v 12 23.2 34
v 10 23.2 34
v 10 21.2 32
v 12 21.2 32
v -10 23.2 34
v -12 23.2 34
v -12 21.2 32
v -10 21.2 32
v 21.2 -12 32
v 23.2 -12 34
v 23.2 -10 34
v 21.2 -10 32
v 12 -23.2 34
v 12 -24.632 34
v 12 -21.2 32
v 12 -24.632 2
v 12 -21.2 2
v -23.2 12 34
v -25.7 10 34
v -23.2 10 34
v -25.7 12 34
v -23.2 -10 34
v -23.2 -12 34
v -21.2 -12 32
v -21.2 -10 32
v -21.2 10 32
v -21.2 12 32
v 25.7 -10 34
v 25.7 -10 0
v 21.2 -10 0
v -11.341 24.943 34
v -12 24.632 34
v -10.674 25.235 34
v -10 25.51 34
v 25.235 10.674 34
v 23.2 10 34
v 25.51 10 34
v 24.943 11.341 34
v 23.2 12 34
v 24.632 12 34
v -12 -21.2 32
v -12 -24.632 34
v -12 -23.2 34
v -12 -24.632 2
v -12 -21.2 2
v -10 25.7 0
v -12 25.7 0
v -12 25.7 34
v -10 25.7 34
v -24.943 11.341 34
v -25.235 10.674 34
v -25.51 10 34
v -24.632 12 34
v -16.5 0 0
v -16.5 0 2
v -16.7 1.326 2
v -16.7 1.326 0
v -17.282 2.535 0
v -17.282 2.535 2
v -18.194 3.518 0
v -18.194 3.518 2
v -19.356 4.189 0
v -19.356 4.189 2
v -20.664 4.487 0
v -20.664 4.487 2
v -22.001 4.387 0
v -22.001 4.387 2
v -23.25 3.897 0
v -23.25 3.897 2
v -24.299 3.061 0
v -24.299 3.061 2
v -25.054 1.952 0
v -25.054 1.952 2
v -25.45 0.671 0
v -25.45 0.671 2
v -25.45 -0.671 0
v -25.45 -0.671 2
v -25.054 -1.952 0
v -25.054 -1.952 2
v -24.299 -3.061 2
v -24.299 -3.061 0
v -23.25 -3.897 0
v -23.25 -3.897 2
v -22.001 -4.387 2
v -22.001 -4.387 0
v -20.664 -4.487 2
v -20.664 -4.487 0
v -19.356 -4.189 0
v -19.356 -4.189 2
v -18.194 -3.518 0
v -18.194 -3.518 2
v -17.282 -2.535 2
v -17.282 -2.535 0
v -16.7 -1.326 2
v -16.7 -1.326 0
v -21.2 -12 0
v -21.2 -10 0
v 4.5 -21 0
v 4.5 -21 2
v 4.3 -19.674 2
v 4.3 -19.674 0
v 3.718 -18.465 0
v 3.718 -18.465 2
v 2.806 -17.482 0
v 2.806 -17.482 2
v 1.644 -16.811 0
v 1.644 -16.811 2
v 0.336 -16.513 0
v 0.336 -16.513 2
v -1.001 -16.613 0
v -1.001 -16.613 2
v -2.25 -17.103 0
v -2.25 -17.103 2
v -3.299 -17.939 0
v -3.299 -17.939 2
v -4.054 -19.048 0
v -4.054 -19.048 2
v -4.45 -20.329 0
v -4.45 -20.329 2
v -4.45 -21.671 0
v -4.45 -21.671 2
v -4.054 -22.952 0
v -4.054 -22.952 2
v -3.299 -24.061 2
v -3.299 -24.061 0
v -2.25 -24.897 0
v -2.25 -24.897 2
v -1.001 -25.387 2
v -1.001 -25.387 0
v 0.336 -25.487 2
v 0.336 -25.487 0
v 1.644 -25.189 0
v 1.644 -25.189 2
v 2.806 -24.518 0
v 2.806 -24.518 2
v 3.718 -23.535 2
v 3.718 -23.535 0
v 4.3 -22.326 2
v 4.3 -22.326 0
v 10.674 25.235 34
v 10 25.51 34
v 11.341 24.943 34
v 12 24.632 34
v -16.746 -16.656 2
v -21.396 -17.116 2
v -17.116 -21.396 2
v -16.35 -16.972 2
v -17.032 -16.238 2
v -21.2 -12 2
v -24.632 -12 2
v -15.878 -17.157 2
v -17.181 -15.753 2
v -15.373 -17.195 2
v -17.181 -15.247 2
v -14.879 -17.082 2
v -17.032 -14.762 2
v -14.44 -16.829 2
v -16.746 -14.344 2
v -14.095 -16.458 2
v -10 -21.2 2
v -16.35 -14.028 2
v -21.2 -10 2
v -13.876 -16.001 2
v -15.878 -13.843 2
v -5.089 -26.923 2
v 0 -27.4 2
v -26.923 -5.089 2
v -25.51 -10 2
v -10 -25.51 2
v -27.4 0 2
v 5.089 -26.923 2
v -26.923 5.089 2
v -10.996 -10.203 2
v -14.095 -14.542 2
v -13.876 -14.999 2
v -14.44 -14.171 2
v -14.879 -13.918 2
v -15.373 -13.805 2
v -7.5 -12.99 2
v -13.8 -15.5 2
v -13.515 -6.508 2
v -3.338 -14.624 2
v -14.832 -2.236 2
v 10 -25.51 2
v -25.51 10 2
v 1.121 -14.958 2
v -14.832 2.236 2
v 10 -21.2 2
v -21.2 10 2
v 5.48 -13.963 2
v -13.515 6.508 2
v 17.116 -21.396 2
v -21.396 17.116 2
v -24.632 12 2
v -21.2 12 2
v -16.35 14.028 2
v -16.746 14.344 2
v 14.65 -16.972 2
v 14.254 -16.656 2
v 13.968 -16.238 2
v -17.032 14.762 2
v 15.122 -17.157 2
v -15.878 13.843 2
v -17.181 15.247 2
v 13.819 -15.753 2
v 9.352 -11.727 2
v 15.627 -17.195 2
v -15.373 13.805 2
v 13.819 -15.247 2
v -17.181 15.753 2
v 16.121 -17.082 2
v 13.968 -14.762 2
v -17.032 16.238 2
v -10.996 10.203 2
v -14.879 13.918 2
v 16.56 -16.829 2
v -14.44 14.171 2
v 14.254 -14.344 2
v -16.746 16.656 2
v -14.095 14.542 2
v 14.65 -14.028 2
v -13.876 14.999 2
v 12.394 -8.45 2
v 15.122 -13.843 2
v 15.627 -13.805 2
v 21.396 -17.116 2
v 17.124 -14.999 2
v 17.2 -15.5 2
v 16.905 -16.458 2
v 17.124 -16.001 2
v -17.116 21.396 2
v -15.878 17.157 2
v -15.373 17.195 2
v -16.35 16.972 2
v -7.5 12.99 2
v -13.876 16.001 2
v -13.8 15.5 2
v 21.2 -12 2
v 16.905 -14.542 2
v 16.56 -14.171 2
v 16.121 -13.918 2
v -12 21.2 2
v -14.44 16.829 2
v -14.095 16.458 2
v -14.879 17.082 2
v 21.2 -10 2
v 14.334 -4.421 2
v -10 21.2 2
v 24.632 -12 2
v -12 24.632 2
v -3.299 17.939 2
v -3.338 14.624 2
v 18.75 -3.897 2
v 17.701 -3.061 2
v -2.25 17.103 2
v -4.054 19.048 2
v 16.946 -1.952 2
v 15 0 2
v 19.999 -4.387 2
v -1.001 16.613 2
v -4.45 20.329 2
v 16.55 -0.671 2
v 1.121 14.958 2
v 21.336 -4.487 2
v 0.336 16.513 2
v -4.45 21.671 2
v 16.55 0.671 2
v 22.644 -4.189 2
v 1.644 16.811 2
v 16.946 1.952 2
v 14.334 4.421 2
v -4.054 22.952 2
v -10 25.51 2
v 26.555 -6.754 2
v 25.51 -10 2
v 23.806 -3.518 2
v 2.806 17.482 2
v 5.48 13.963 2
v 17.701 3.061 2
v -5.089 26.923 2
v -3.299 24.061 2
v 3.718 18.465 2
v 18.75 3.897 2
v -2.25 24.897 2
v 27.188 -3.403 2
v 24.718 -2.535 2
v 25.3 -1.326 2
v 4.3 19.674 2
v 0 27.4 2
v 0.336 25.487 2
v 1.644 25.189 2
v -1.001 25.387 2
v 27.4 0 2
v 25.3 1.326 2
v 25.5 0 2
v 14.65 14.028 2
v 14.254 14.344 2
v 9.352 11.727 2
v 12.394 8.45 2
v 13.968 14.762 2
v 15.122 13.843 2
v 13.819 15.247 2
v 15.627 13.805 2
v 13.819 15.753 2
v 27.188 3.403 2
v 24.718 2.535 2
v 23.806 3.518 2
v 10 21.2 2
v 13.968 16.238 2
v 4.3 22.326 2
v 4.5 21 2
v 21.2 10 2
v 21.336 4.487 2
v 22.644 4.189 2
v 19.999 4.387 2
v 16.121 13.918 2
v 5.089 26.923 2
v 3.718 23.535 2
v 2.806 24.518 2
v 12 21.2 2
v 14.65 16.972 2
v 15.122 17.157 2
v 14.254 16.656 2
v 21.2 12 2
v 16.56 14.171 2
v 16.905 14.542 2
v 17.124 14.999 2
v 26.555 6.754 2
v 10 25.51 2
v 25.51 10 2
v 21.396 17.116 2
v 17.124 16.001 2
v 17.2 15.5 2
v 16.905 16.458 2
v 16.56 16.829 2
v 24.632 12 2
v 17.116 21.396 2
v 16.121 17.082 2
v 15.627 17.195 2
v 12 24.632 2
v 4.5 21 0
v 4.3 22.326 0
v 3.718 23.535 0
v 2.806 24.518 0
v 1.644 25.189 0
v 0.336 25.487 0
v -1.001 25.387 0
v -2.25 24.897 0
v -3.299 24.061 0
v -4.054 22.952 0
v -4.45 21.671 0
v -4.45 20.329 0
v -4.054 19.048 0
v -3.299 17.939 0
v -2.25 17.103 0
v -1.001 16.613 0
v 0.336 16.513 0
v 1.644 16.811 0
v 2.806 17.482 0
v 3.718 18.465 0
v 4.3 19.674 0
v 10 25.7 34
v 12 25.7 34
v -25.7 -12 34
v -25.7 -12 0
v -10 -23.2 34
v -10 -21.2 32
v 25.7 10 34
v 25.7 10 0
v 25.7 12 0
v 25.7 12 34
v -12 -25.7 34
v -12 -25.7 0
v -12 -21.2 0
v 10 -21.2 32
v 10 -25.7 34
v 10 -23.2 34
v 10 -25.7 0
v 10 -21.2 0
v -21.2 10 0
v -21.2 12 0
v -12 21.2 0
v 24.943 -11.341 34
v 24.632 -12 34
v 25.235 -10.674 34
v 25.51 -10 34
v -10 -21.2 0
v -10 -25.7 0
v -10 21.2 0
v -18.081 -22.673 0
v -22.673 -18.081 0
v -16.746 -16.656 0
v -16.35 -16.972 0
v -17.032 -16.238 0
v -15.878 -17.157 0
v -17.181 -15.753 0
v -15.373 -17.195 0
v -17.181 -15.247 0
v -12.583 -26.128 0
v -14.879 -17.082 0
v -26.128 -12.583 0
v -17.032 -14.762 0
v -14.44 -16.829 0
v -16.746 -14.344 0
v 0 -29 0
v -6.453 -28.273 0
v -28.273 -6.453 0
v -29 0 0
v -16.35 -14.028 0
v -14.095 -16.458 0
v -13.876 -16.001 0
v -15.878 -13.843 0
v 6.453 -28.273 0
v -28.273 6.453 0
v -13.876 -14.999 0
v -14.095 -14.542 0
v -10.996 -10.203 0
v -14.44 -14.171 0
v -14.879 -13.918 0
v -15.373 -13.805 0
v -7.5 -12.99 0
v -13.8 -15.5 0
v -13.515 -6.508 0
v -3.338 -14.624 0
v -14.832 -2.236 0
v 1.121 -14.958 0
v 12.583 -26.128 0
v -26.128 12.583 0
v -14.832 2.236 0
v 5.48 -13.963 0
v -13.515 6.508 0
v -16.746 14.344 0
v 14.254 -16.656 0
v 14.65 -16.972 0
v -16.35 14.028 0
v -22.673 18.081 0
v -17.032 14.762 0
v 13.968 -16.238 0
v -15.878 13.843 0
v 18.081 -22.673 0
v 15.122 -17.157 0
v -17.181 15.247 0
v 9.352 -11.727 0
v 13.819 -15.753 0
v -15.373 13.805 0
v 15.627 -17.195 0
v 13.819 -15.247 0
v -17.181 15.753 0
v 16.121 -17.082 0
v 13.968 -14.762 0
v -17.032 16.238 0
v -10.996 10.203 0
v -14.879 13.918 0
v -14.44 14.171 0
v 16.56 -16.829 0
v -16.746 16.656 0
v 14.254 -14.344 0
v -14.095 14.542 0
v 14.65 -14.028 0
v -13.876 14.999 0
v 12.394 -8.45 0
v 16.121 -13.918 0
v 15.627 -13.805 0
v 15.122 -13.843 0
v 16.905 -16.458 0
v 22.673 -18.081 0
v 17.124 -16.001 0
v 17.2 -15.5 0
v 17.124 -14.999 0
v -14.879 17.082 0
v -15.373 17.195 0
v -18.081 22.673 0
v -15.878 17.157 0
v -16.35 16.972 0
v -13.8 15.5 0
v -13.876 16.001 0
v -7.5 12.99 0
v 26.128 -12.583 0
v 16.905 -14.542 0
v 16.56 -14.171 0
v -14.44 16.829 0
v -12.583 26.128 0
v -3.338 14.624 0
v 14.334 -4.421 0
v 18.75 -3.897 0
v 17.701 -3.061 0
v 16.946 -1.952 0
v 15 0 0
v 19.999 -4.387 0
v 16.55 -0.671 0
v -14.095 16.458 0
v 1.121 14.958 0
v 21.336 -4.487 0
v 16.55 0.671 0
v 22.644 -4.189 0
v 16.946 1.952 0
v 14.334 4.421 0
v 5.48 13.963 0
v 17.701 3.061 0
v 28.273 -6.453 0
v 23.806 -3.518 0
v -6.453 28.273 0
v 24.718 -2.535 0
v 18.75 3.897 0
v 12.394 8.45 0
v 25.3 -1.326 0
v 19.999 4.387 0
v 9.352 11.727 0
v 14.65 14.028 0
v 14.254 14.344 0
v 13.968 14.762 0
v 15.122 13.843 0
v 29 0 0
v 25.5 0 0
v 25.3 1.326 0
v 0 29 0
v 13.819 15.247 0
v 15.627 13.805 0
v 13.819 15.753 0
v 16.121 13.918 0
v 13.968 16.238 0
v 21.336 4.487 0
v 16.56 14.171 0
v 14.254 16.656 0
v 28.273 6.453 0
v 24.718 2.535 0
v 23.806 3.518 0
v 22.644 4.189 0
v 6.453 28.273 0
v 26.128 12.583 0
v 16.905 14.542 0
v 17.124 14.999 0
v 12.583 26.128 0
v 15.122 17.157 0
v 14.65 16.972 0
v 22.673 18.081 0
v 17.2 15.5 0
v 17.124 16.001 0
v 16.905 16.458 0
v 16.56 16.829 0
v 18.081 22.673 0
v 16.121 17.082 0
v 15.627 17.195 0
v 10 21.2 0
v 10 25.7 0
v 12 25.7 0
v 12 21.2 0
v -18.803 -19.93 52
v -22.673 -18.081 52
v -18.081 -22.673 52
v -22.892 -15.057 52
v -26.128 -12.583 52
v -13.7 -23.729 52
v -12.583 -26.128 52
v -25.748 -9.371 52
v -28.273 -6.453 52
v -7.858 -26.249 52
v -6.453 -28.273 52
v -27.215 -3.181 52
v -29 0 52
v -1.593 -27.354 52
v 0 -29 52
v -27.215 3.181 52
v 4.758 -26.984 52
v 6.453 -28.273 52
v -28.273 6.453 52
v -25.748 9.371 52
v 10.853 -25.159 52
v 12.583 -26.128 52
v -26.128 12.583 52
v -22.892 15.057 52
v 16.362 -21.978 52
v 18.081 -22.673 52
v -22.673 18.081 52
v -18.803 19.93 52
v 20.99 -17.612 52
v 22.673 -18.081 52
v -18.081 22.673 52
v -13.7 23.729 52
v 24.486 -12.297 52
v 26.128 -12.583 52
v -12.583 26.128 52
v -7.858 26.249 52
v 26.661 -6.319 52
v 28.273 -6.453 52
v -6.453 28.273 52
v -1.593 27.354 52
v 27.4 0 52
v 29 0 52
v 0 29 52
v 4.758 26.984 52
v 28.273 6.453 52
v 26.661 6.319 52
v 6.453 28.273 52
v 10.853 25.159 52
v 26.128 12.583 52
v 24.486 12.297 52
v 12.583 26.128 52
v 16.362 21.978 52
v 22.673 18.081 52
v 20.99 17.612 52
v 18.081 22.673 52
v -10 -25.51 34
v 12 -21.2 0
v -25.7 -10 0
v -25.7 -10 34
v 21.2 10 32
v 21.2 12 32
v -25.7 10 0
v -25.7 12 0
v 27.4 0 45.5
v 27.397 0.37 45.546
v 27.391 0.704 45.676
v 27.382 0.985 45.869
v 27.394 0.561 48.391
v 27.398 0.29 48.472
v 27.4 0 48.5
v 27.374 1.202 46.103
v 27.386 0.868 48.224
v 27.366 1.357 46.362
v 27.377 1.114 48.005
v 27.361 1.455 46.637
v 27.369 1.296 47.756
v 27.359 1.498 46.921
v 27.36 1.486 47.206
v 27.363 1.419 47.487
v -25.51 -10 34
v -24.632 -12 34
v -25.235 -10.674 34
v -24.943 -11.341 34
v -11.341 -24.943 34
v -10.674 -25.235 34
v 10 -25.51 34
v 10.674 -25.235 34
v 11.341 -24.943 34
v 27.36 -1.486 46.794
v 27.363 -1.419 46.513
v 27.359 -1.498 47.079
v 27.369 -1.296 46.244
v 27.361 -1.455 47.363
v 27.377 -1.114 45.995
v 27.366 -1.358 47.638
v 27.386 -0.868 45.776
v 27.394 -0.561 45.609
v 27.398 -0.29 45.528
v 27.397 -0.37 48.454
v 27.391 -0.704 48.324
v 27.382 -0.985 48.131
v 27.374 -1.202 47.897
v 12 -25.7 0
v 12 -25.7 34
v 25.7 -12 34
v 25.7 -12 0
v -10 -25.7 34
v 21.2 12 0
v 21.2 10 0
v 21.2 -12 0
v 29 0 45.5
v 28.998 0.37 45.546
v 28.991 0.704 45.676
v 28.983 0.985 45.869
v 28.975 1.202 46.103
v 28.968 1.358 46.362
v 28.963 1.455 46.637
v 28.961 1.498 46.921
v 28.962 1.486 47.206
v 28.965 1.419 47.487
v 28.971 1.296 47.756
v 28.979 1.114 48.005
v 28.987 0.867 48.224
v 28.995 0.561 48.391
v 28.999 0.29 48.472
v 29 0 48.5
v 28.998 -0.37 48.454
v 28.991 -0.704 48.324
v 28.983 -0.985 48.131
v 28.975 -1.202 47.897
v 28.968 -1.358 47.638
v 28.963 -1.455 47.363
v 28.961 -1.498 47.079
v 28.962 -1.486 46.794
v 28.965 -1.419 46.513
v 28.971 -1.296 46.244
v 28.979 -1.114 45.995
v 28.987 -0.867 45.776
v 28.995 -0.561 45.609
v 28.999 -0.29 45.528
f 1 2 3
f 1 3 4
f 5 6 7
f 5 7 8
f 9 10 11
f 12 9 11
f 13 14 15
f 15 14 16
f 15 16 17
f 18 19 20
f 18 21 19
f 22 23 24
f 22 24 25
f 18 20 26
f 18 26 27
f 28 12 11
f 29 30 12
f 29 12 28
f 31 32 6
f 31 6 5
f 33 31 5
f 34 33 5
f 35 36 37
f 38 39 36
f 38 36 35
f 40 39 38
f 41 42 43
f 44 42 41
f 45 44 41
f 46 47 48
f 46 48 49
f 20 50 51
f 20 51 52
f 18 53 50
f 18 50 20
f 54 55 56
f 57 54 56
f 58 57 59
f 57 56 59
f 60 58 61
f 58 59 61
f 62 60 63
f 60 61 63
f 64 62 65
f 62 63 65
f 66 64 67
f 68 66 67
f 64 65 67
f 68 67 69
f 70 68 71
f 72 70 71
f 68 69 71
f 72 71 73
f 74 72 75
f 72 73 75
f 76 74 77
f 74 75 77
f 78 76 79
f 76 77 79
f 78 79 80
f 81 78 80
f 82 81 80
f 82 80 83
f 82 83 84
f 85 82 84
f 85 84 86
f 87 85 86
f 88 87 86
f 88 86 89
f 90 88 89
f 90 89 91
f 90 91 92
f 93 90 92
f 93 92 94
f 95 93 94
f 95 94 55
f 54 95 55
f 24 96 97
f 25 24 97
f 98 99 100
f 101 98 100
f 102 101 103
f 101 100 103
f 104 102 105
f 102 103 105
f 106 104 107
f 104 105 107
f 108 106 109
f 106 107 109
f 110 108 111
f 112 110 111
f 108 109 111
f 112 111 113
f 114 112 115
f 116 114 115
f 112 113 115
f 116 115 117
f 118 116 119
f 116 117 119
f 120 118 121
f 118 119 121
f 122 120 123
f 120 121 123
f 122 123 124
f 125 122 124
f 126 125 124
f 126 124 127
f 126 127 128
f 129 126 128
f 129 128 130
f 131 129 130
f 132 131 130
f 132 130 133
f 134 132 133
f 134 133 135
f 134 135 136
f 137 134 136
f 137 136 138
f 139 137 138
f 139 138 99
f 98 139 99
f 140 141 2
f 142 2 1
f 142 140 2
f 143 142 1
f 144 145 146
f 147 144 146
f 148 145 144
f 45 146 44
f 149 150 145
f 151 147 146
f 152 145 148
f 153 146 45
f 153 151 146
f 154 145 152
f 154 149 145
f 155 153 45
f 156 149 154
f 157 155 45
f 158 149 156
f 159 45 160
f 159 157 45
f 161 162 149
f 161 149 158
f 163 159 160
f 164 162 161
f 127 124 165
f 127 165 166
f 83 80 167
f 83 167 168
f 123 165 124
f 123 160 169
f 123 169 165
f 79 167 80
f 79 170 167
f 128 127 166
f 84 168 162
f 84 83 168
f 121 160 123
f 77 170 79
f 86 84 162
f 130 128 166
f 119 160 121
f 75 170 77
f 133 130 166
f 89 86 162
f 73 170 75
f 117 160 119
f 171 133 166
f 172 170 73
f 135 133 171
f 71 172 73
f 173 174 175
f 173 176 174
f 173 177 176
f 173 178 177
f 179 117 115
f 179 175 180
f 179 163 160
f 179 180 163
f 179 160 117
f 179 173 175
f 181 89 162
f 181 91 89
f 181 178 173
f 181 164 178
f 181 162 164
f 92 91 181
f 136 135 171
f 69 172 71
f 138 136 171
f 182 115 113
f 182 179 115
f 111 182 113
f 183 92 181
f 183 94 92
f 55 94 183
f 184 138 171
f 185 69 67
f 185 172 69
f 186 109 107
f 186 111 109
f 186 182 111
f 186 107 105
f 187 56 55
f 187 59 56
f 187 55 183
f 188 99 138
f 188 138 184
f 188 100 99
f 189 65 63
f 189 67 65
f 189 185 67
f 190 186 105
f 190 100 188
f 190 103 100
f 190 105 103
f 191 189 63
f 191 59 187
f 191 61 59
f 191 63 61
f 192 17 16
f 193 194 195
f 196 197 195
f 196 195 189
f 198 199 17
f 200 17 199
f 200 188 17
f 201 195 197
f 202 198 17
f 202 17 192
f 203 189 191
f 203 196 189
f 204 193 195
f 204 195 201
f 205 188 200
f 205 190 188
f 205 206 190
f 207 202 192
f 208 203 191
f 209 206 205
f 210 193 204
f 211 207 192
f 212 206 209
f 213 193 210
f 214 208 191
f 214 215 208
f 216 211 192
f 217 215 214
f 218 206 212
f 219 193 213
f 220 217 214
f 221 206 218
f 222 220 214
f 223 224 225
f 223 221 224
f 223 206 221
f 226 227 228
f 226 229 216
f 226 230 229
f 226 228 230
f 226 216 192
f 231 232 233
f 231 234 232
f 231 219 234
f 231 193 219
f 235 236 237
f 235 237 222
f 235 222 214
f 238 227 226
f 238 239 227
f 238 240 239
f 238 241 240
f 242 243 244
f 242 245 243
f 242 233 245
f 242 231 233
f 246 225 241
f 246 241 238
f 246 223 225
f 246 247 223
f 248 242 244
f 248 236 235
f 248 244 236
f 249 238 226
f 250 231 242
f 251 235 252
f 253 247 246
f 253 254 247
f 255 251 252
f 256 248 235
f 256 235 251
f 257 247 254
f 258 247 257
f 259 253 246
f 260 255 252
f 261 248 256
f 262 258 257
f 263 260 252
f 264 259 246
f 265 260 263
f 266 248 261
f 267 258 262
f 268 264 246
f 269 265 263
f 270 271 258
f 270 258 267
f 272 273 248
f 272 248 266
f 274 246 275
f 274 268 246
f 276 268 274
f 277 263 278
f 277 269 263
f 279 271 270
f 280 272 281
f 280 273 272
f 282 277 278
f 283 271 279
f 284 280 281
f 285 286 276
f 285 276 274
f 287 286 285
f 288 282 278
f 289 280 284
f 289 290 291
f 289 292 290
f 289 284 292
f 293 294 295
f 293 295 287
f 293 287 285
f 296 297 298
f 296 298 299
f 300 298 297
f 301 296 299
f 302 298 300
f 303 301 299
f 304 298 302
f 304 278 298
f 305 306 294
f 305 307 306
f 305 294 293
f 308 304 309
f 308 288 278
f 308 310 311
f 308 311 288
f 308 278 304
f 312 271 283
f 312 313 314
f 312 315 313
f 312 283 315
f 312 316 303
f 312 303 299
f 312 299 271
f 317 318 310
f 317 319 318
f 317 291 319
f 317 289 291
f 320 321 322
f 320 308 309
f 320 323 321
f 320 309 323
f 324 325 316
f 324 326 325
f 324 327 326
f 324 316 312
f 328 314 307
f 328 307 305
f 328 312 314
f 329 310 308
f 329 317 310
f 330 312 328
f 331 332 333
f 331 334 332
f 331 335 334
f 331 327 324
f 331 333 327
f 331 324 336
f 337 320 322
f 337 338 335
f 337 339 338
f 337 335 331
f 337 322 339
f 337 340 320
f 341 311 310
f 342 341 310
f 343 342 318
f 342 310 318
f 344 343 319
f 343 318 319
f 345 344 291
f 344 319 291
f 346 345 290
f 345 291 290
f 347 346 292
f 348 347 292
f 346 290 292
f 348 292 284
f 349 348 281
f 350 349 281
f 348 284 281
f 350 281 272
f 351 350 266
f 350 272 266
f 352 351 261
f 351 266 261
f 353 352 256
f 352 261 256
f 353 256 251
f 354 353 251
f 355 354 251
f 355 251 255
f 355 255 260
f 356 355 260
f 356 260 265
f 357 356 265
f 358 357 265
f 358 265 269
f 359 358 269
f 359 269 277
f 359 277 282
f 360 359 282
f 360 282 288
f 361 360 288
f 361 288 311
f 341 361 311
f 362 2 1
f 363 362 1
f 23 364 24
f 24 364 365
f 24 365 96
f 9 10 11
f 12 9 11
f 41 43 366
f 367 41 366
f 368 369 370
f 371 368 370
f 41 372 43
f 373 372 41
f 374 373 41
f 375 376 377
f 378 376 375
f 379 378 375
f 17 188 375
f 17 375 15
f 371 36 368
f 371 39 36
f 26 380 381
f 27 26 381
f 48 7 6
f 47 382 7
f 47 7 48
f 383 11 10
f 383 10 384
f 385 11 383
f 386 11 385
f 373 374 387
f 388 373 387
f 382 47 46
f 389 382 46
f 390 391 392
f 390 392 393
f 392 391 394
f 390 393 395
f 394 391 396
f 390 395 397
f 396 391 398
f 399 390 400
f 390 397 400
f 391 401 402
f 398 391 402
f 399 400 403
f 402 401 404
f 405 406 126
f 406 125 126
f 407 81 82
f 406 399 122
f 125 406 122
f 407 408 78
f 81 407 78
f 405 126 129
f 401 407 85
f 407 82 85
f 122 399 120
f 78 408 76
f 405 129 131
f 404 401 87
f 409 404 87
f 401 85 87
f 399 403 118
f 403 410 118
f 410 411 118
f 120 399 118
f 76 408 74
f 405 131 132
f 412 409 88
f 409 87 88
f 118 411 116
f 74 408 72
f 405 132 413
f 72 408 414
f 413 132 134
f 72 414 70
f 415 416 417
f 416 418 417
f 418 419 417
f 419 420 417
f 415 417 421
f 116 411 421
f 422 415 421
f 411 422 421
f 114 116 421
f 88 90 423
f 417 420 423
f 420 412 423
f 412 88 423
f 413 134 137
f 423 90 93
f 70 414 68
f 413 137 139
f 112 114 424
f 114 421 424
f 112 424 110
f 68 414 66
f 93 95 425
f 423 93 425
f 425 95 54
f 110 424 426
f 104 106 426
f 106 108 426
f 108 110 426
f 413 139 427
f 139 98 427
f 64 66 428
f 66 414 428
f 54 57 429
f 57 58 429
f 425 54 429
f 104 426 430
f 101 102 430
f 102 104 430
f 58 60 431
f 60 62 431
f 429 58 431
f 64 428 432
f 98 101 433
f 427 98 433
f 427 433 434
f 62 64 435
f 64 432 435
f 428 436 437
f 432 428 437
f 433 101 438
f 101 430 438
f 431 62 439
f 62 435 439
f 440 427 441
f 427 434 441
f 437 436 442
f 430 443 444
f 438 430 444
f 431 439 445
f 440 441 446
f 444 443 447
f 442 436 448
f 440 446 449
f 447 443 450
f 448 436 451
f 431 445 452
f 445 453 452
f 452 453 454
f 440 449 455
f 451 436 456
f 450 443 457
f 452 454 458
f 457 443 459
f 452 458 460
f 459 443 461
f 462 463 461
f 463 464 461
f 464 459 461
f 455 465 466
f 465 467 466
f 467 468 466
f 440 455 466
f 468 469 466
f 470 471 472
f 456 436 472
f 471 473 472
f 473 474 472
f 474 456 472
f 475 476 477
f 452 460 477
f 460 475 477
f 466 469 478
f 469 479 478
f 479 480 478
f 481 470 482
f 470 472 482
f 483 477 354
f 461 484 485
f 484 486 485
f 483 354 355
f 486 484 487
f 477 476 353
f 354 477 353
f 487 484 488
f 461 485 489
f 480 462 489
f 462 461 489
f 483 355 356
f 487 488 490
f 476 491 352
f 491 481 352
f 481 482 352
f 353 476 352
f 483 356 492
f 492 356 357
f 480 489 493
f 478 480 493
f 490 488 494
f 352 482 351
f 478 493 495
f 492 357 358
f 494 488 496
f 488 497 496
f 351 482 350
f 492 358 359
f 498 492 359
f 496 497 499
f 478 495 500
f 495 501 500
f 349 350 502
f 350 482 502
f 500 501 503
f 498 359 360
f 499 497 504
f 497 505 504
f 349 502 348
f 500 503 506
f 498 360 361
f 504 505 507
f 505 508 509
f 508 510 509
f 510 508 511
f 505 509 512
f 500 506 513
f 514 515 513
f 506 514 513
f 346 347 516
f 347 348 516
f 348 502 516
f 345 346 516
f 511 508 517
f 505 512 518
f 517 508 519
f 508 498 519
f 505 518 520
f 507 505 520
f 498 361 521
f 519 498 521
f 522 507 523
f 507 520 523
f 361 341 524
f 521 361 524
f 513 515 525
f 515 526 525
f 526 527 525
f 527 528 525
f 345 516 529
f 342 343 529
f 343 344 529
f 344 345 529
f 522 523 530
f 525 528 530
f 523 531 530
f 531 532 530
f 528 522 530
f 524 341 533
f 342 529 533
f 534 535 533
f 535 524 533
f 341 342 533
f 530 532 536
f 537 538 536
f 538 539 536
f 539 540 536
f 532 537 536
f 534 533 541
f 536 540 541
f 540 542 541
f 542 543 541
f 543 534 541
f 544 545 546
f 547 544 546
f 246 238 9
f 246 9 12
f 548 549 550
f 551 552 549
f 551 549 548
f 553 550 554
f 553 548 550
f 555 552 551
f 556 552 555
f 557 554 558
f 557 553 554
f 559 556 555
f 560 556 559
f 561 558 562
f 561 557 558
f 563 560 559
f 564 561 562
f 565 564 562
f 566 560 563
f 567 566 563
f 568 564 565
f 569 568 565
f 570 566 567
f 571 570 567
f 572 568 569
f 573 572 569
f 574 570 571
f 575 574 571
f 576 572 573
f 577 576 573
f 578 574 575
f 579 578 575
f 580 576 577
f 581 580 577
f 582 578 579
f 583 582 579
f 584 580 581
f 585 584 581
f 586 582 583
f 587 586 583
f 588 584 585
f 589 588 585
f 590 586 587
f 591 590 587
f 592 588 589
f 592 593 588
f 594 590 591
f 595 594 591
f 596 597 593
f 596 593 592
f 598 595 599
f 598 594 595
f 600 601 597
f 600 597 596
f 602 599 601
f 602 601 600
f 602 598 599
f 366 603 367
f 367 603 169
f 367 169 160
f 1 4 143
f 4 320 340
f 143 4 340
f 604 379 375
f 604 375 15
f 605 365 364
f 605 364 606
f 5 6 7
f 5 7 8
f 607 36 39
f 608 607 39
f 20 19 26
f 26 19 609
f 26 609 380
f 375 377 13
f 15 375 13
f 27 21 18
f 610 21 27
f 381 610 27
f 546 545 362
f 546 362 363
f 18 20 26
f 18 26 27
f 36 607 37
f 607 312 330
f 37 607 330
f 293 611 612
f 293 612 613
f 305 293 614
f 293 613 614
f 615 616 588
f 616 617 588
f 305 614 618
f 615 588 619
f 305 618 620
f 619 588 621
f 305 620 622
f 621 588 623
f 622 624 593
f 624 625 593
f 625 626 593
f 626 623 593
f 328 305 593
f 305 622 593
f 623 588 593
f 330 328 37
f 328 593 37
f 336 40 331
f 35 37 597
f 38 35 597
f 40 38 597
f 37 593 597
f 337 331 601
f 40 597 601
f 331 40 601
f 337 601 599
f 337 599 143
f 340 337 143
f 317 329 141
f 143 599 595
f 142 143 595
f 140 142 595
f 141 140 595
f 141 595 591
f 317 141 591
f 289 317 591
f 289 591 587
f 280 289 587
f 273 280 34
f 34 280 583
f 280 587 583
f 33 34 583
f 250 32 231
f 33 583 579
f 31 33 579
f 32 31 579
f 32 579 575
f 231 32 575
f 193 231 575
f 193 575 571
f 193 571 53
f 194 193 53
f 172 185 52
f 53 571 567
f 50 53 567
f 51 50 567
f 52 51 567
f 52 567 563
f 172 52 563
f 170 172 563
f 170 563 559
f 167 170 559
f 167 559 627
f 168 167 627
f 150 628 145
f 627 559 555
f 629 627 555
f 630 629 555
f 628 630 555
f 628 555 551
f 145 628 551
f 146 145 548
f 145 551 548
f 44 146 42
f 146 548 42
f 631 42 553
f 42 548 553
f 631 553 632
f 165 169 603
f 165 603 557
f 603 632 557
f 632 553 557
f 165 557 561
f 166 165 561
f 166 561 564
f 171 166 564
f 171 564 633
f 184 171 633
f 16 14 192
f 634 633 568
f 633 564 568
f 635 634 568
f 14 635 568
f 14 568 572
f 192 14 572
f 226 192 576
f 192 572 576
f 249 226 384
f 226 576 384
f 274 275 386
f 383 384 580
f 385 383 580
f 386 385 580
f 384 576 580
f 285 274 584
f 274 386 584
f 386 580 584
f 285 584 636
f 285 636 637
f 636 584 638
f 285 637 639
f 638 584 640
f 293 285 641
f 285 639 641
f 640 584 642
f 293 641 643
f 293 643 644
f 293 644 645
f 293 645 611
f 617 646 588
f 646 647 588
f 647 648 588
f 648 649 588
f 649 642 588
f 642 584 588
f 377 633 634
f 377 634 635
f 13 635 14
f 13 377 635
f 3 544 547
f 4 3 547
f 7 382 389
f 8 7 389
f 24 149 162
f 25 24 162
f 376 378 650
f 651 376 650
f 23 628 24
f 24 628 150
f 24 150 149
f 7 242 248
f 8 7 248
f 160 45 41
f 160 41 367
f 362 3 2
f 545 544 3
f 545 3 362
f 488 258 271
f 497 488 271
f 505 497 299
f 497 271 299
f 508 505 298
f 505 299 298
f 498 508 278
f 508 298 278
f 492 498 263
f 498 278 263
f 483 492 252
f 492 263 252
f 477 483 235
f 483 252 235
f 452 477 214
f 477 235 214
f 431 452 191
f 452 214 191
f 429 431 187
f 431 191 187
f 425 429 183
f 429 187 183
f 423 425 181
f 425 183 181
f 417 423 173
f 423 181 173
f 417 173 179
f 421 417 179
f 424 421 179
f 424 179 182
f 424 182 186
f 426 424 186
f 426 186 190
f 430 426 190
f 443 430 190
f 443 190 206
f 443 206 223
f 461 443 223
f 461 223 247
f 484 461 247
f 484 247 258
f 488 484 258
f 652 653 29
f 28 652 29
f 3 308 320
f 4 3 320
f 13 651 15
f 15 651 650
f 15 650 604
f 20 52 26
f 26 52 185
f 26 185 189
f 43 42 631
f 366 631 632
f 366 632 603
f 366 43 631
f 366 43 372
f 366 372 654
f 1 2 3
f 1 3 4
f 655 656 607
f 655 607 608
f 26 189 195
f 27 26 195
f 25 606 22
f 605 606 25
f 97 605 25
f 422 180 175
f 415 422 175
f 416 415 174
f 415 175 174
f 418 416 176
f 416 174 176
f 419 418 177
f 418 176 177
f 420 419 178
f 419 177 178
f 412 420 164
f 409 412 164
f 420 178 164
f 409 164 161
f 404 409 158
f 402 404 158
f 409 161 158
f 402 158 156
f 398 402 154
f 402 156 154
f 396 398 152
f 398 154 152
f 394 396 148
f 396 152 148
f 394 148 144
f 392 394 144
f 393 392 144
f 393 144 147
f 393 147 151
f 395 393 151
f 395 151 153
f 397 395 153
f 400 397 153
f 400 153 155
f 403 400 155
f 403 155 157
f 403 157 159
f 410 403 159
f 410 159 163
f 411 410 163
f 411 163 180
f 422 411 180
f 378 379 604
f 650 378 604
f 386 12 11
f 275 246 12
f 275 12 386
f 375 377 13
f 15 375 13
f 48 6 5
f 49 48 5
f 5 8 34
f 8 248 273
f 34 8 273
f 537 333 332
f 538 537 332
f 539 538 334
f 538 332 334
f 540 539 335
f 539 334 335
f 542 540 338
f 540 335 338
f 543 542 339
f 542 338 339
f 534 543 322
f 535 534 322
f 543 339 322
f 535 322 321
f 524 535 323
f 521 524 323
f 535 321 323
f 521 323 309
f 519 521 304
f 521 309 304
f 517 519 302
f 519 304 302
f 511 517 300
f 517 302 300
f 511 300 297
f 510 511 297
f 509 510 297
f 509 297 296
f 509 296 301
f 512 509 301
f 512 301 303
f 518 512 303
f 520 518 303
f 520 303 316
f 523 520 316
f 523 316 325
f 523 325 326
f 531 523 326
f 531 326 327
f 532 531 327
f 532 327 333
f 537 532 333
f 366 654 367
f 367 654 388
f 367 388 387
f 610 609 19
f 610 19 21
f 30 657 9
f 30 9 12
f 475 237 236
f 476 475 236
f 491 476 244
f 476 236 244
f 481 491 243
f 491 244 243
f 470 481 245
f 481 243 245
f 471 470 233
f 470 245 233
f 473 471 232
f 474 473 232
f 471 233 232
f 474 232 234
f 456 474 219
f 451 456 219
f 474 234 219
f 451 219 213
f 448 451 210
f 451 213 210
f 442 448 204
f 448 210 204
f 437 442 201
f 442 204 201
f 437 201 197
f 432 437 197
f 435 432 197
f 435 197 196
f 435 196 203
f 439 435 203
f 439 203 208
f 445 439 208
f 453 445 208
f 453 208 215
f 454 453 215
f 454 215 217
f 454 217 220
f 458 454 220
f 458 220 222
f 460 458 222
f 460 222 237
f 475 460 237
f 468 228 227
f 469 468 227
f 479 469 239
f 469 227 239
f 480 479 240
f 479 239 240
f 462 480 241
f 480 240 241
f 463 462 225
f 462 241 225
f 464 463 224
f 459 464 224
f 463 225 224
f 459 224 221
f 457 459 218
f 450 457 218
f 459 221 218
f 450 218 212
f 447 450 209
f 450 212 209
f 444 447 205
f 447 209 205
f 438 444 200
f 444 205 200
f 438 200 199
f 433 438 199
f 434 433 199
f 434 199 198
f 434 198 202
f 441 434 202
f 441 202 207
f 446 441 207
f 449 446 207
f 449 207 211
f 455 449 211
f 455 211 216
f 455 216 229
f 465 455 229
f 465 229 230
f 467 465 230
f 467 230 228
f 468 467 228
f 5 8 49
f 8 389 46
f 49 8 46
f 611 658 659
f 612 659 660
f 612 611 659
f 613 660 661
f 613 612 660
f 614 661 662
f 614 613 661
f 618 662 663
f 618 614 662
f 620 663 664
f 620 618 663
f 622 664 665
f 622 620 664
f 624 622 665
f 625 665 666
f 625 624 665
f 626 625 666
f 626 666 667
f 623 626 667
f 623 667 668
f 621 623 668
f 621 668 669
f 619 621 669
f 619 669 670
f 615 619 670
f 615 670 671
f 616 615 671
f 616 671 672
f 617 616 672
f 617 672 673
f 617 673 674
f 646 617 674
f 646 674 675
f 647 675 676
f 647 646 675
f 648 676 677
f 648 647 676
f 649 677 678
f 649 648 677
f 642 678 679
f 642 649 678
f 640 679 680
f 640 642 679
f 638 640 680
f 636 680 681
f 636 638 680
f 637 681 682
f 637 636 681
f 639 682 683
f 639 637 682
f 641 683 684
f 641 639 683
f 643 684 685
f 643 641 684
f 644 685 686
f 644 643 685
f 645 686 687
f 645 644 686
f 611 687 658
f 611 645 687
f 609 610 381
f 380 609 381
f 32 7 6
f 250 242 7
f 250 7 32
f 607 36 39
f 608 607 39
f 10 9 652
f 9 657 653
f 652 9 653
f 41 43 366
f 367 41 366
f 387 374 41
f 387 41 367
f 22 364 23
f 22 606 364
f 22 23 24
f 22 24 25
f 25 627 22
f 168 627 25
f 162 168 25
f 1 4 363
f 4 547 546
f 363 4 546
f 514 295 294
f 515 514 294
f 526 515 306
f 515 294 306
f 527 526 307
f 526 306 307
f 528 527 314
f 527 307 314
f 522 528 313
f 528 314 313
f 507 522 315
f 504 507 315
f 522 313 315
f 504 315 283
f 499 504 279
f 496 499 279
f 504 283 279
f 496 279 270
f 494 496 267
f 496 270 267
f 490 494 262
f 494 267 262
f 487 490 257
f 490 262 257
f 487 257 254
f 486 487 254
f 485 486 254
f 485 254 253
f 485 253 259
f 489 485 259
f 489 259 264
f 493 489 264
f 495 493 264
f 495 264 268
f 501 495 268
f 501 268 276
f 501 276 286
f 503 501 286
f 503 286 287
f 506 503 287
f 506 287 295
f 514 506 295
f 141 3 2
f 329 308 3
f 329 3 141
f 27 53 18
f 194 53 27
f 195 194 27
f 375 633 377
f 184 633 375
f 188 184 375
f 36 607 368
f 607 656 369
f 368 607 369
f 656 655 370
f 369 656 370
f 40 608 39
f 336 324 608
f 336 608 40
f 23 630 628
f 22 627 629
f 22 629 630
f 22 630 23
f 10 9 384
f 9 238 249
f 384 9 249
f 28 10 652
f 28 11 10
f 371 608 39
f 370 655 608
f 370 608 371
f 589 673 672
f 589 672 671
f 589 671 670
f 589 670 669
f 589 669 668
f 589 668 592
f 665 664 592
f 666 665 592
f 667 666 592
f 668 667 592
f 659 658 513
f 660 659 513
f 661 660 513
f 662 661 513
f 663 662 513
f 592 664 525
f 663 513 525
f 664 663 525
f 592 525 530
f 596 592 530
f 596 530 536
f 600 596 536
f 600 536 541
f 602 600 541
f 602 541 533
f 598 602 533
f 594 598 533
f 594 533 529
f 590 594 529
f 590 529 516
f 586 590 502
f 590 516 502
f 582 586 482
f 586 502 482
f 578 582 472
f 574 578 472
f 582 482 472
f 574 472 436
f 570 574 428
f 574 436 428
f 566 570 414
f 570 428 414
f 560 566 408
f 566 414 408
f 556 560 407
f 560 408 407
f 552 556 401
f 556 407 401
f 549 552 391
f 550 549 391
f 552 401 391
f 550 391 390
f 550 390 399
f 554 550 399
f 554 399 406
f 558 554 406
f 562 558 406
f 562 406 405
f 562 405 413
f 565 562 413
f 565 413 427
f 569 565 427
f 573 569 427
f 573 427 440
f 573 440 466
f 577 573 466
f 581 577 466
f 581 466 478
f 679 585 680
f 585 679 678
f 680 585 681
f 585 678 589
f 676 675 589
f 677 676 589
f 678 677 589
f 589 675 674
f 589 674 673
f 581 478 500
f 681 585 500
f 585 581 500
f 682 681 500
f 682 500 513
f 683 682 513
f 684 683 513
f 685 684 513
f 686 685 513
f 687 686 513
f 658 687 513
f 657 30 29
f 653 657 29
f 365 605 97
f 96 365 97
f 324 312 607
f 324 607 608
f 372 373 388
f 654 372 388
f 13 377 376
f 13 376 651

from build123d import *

# Parameters (mm, degrees)
SKETCH002_W             = 2
SKETCH002_H             = 4.5
SKETCH002_W_2           = 4.5
SKETCH002_H_2           = 2
PAD_DEPTH               = 34
CHAMFER_SIZE            = 2
CYLINDER001_R           = 1.5
CYLINDER001_DEPTH       = 10
CYLINDER001_PITCH_ANGLE = 90
CHAMFER001_SIZE         = 2
CYLINDER_R              = 29
CYLINDER_DEPTH          = 52
SKETCH_R                = 27.4
POCKET_DEPTH            = 50
SKETCH001_R             = 1.7
SKETCH001_R_2           = 15
SKETCH001_R_3           = 4.5
POCKET001_DEPTH         = 2.001


with BuildPart() as pad:
    # Sketch002 → Pad (new body)
    with BuildSketch(Plane.XY):
        with Locations((-11, 23.45)):
            Rectangle(SKETCH002_W, SKETCH002_H)
        with Locations((11, 23.45)):
            Rectangle(SKETCH002_W, SKETCH002_H)
        with Locations((-11, -23.45)):
            Rectangle(SKETCH002_W, SKETCH002_H)
        with Locations((11, -23.45)):
            Rectangle(SKETCH002_W, SKETCH002_H)
        with Locations((23.45, 11)):
            Rectangle(SKETCH002_W_2, SKETCH002_H_2)
        with Locations((23.45, -11)):
            Rectangle(SKETCH002_W_2, SKETCH002_H_2)
        with Locations((-23.45, 11)):
            Rectangle(SKETCH002_W_2, SKETCH002_H_2)
        with Locations((-23.45, -11)):
            Rectangle(SKETCH002_W_2, SKETCH002_H_2)
    extrude(amount=PAD_DEPTH)


with BuildPart() as chamfer_body:
    # Chamfer base: copy of Pad
    add(pad.part)

    # Chamfer
    chamfer_edges = [chamfer_body.edges().sort_by_distance(p)[0] for p in [
        (-21.2, -11, 34),
        (-11, -21.2, 34),
        (11, -21.2, 34),
        (21.2, -11, 34),
        (21.2, 11, 34),
        (11, 21.2, 34),
        (-11, 21.2, 34),
        (-21.2, 11, 34),
    ]]
    chamfer(chamfer_edges, length=CHAMFER_SIZE)


with BuildPart() as cylinder001:
    # Cylinder001 → Cylinder001 (new body)
    with BuildSketch(Plane.XY):
        Circle(CYLINDER001_R)
    extrude(amount=CYLINDER001_DEPTH)


with BuildPart() as cylinder001_1:
    # Cylinder001 pitch: moved
    add(cylinder001.part.rotate(Axis((0, 0, 0), (0, 1, 0)), CYLINDER001_PITCH_ANGLE))


with BuildPart() as cylinder001_2:
    # Cylinder001 placement: moved
    add(cylinder001_1.part.moved(Location((22, 0, 47))))


with BuildPart() as chamfer001:
    # Chamfer001 base: copy of Pad
    add(pad.part)

    # Chamfer001
    chamfer001_edges = [chamfer001.edges().sort_by_distance(p)[0] for p in [
        (-21.2, -11, 34),
        (-11, -21.2, 34),
        (11, -21.2, 34),
        (21.2, -11, 34),
        (21.2, 11, 34),
        (11, 21.2, 34),
        (-11, 21.2, 34),
        (-21.2, 11, 34),
    ]]
    chamfer(chamfer001_edges, length=CHAMFER001_SIZE)


with BuildPart() as cut:
    # Cylinder → Cylinder (new body)
    with BuildSketch(Plane.XY):
        Circle(CYLINDER_R)
    extrude(amount=CYLINDER_DEPTH)

    # Sketch → Pocket (cut)
    with BuildSketch(Plane.XY.offset(52)):
        Circle(SKETCH_R)
    extrude(amount=-POCKET_DEPTH, mode=Mode.SUBTRACT)

    # Sketch001 → Pocket001 (cut, through all)
    with BuildSketch(Plane.XY.offset(2)):
        with Locations((-15.5, 15.5)):
            Circle(SKETCH001_R)
        with Locations((15.5, 15.5)):
            Circle(SKETCH001_R)
        with Locations((-15.5, -15.5)):
            Circle(SKETCH001_R)
        with Locations((15.5, -15.5)):
            Circle(SKETCH001_R)
        Circle(SKETCH001_R_2)
        with Locations((-21, 0)):
            Circle(SKETCH001_R_3)
        with Locations((21, 0)):
            Circle(SKETCH001_R_3)
        with Locations((0, 21)):
            Circle(SKETCH001_R_3)
        with Locations((0, -21)):
            Circle(SKETCH001_R_3)
    extrude(amount=-POCKET001_DEPTH, mode=Mode.SUBTRACT)

    # Fusion: union Chamfer001
    add(chamfer001.part)

    # Cut: cut Cylinder001
    add(cylinder001_2.part, mode=Mode.SUBTRACT)


solid = Compound([chamfer_body.part, cut.part])
